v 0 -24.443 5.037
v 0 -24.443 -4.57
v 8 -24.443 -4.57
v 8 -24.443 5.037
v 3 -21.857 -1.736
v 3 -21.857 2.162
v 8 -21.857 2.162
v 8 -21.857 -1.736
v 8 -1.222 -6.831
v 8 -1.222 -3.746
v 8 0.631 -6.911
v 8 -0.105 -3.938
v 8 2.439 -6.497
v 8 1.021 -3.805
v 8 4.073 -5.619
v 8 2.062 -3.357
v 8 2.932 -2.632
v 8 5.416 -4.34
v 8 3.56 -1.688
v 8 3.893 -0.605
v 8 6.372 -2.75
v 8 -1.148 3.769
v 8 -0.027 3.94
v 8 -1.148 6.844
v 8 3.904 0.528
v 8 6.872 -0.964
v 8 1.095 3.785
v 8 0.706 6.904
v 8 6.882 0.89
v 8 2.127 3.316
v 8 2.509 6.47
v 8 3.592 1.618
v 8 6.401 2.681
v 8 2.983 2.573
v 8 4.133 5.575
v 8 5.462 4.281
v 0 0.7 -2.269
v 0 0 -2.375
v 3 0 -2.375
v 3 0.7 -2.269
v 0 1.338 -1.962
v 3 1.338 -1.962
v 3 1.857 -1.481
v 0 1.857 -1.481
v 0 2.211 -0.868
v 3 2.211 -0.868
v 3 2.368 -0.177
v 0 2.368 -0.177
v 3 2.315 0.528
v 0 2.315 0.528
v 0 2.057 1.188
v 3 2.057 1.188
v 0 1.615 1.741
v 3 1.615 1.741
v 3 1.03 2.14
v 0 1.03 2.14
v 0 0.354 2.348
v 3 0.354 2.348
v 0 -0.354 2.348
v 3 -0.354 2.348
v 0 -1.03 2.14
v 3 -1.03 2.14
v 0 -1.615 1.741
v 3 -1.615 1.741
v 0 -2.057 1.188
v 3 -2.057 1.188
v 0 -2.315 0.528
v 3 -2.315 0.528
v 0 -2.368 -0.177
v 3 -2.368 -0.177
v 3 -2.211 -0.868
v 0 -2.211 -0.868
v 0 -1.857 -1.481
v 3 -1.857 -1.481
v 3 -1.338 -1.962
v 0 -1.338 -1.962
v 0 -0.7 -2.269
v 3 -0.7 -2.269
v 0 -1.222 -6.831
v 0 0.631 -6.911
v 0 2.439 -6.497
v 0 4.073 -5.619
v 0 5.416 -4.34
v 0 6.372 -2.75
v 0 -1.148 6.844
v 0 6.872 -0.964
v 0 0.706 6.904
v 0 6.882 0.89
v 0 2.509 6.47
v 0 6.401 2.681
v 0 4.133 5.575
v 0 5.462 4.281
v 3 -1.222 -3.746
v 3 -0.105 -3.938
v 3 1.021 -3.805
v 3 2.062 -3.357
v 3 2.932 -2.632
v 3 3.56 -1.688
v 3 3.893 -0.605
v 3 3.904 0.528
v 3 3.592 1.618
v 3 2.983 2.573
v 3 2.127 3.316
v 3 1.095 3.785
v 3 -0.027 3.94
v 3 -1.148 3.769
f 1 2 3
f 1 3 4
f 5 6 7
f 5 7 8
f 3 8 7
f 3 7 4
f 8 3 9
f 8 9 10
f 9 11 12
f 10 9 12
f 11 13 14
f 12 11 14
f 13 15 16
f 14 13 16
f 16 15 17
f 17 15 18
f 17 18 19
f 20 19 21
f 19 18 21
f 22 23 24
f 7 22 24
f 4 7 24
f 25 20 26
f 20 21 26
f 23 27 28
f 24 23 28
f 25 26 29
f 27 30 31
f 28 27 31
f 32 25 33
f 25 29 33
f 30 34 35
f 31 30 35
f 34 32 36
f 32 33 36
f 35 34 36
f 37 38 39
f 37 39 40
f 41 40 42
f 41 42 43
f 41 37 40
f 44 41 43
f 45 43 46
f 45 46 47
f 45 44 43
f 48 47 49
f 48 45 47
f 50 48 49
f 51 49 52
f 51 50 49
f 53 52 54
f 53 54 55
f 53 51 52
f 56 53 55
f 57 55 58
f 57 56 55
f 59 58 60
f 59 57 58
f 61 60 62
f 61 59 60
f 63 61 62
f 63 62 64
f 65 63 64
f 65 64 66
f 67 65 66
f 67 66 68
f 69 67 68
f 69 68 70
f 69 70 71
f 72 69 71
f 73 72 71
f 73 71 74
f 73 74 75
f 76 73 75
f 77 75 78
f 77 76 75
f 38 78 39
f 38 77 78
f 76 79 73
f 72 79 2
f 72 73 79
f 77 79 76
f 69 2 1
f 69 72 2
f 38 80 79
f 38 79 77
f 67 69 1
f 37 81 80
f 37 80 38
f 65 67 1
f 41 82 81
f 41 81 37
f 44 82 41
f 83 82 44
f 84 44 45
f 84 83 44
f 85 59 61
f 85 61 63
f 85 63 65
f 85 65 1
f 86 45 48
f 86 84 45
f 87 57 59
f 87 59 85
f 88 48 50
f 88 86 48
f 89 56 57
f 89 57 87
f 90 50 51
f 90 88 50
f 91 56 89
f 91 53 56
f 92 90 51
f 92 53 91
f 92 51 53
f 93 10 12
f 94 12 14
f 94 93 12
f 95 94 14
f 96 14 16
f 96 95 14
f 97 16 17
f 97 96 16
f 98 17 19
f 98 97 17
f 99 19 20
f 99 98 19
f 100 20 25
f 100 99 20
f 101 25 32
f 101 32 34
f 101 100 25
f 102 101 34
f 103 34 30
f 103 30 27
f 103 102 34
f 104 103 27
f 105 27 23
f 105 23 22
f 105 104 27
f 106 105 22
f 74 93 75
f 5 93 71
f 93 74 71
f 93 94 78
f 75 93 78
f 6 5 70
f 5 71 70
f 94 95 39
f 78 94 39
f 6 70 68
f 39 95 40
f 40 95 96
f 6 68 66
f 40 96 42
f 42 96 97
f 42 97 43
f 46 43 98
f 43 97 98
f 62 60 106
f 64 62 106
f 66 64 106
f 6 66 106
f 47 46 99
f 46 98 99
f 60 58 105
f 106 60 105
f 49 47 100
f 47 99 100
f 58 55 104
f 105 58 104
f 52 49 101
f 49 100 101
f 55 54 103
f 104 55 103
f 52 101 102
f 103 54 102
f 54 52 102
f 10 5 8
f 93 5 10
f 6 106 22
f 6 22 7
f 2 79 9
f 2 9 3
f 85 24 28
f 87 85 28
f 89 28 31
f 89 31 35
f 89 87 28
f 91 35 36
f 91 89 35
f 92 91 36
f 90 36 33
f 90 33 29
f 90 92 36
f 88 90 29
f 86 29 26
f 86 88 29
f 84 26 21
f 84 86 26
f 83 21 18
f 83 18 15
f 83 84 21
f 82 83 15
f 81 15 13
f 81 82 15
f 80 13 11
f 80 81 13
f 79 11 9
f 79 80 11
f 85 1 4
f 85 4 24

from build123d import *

# Parameters (mm, degrees)
BOSS_EXTRUDE1_DEPTH = 8
SKETCH1_3_R         = 2.375
BOSS_EXTRUDE2_DEPTH = 3


with BuildPart() as part:
    # Sketch1 → Boss-Extrude1 (new body)
    with BuildSketch(Plane(origin=(0, 0, 0), x_dir=(0, 0, -1), z_dir=(1, 0, 0))):
        with BuildLine():
            ThreePointArc((6.831434318, -1.221589567), (0.037477219, 6.939695337), (-6.84422965, -1.147735338))
            Line((-6.84422965, -1.147735338), (-5.036656509, -24.443075278))
            Line((-5.036656509, -24.443075278), (4.569647847, -24.443075278))
            Line((4.569647847, -24.443075278), (6.831434318, -1.221589567))
        make_face()
        with BuildLine():
            Line((-2.162031314, -21.856629017), (-3.768912351, -1.147735338))
            ThreePointArc((-3.768912351, -1.147735338), (0.038719155, 3.939606268), (3.745626202, -1.221589567))
            Line((3.745626202, -1.221589567), (1.73576113, -21.856629017))
            Line((1.73576113, -21.856629017), (-2.162031314, -21.856629017))
        make_face(mode=Mode.SUBTRACT)
    extrude(amount=BOSS_EXTRUDE1_DEPTH)

    # Sketch1<3> → Boss-Extrude2 (add)
    with BuildSketch(Plane(origin=(0, 0, 0), x_dir=(0, 0, -1), z_dir=(1, 0, 0))):
        with BuildLine():
            ThreePointArc((3.745626202, -1.221589567), (0.038719155, 3.939606268), (-3.768912351, -1.147735338))
            Line((-3.768912351, -1.147735338), (-2.162031314, -21.856629017))
            Line((-2.162031314, -21.856629017), (1.73576113, -21.856629017))
            Line((1.73576113, -21.856629017), (3.745626202, -1.221589567))
        make_face()
        Circle(SKETCH1_3_R, mode=Mode.SUBTRACT)
    extrude(amount=BOSS_EXTRUDE2_DEPTH)


solid = part.part
